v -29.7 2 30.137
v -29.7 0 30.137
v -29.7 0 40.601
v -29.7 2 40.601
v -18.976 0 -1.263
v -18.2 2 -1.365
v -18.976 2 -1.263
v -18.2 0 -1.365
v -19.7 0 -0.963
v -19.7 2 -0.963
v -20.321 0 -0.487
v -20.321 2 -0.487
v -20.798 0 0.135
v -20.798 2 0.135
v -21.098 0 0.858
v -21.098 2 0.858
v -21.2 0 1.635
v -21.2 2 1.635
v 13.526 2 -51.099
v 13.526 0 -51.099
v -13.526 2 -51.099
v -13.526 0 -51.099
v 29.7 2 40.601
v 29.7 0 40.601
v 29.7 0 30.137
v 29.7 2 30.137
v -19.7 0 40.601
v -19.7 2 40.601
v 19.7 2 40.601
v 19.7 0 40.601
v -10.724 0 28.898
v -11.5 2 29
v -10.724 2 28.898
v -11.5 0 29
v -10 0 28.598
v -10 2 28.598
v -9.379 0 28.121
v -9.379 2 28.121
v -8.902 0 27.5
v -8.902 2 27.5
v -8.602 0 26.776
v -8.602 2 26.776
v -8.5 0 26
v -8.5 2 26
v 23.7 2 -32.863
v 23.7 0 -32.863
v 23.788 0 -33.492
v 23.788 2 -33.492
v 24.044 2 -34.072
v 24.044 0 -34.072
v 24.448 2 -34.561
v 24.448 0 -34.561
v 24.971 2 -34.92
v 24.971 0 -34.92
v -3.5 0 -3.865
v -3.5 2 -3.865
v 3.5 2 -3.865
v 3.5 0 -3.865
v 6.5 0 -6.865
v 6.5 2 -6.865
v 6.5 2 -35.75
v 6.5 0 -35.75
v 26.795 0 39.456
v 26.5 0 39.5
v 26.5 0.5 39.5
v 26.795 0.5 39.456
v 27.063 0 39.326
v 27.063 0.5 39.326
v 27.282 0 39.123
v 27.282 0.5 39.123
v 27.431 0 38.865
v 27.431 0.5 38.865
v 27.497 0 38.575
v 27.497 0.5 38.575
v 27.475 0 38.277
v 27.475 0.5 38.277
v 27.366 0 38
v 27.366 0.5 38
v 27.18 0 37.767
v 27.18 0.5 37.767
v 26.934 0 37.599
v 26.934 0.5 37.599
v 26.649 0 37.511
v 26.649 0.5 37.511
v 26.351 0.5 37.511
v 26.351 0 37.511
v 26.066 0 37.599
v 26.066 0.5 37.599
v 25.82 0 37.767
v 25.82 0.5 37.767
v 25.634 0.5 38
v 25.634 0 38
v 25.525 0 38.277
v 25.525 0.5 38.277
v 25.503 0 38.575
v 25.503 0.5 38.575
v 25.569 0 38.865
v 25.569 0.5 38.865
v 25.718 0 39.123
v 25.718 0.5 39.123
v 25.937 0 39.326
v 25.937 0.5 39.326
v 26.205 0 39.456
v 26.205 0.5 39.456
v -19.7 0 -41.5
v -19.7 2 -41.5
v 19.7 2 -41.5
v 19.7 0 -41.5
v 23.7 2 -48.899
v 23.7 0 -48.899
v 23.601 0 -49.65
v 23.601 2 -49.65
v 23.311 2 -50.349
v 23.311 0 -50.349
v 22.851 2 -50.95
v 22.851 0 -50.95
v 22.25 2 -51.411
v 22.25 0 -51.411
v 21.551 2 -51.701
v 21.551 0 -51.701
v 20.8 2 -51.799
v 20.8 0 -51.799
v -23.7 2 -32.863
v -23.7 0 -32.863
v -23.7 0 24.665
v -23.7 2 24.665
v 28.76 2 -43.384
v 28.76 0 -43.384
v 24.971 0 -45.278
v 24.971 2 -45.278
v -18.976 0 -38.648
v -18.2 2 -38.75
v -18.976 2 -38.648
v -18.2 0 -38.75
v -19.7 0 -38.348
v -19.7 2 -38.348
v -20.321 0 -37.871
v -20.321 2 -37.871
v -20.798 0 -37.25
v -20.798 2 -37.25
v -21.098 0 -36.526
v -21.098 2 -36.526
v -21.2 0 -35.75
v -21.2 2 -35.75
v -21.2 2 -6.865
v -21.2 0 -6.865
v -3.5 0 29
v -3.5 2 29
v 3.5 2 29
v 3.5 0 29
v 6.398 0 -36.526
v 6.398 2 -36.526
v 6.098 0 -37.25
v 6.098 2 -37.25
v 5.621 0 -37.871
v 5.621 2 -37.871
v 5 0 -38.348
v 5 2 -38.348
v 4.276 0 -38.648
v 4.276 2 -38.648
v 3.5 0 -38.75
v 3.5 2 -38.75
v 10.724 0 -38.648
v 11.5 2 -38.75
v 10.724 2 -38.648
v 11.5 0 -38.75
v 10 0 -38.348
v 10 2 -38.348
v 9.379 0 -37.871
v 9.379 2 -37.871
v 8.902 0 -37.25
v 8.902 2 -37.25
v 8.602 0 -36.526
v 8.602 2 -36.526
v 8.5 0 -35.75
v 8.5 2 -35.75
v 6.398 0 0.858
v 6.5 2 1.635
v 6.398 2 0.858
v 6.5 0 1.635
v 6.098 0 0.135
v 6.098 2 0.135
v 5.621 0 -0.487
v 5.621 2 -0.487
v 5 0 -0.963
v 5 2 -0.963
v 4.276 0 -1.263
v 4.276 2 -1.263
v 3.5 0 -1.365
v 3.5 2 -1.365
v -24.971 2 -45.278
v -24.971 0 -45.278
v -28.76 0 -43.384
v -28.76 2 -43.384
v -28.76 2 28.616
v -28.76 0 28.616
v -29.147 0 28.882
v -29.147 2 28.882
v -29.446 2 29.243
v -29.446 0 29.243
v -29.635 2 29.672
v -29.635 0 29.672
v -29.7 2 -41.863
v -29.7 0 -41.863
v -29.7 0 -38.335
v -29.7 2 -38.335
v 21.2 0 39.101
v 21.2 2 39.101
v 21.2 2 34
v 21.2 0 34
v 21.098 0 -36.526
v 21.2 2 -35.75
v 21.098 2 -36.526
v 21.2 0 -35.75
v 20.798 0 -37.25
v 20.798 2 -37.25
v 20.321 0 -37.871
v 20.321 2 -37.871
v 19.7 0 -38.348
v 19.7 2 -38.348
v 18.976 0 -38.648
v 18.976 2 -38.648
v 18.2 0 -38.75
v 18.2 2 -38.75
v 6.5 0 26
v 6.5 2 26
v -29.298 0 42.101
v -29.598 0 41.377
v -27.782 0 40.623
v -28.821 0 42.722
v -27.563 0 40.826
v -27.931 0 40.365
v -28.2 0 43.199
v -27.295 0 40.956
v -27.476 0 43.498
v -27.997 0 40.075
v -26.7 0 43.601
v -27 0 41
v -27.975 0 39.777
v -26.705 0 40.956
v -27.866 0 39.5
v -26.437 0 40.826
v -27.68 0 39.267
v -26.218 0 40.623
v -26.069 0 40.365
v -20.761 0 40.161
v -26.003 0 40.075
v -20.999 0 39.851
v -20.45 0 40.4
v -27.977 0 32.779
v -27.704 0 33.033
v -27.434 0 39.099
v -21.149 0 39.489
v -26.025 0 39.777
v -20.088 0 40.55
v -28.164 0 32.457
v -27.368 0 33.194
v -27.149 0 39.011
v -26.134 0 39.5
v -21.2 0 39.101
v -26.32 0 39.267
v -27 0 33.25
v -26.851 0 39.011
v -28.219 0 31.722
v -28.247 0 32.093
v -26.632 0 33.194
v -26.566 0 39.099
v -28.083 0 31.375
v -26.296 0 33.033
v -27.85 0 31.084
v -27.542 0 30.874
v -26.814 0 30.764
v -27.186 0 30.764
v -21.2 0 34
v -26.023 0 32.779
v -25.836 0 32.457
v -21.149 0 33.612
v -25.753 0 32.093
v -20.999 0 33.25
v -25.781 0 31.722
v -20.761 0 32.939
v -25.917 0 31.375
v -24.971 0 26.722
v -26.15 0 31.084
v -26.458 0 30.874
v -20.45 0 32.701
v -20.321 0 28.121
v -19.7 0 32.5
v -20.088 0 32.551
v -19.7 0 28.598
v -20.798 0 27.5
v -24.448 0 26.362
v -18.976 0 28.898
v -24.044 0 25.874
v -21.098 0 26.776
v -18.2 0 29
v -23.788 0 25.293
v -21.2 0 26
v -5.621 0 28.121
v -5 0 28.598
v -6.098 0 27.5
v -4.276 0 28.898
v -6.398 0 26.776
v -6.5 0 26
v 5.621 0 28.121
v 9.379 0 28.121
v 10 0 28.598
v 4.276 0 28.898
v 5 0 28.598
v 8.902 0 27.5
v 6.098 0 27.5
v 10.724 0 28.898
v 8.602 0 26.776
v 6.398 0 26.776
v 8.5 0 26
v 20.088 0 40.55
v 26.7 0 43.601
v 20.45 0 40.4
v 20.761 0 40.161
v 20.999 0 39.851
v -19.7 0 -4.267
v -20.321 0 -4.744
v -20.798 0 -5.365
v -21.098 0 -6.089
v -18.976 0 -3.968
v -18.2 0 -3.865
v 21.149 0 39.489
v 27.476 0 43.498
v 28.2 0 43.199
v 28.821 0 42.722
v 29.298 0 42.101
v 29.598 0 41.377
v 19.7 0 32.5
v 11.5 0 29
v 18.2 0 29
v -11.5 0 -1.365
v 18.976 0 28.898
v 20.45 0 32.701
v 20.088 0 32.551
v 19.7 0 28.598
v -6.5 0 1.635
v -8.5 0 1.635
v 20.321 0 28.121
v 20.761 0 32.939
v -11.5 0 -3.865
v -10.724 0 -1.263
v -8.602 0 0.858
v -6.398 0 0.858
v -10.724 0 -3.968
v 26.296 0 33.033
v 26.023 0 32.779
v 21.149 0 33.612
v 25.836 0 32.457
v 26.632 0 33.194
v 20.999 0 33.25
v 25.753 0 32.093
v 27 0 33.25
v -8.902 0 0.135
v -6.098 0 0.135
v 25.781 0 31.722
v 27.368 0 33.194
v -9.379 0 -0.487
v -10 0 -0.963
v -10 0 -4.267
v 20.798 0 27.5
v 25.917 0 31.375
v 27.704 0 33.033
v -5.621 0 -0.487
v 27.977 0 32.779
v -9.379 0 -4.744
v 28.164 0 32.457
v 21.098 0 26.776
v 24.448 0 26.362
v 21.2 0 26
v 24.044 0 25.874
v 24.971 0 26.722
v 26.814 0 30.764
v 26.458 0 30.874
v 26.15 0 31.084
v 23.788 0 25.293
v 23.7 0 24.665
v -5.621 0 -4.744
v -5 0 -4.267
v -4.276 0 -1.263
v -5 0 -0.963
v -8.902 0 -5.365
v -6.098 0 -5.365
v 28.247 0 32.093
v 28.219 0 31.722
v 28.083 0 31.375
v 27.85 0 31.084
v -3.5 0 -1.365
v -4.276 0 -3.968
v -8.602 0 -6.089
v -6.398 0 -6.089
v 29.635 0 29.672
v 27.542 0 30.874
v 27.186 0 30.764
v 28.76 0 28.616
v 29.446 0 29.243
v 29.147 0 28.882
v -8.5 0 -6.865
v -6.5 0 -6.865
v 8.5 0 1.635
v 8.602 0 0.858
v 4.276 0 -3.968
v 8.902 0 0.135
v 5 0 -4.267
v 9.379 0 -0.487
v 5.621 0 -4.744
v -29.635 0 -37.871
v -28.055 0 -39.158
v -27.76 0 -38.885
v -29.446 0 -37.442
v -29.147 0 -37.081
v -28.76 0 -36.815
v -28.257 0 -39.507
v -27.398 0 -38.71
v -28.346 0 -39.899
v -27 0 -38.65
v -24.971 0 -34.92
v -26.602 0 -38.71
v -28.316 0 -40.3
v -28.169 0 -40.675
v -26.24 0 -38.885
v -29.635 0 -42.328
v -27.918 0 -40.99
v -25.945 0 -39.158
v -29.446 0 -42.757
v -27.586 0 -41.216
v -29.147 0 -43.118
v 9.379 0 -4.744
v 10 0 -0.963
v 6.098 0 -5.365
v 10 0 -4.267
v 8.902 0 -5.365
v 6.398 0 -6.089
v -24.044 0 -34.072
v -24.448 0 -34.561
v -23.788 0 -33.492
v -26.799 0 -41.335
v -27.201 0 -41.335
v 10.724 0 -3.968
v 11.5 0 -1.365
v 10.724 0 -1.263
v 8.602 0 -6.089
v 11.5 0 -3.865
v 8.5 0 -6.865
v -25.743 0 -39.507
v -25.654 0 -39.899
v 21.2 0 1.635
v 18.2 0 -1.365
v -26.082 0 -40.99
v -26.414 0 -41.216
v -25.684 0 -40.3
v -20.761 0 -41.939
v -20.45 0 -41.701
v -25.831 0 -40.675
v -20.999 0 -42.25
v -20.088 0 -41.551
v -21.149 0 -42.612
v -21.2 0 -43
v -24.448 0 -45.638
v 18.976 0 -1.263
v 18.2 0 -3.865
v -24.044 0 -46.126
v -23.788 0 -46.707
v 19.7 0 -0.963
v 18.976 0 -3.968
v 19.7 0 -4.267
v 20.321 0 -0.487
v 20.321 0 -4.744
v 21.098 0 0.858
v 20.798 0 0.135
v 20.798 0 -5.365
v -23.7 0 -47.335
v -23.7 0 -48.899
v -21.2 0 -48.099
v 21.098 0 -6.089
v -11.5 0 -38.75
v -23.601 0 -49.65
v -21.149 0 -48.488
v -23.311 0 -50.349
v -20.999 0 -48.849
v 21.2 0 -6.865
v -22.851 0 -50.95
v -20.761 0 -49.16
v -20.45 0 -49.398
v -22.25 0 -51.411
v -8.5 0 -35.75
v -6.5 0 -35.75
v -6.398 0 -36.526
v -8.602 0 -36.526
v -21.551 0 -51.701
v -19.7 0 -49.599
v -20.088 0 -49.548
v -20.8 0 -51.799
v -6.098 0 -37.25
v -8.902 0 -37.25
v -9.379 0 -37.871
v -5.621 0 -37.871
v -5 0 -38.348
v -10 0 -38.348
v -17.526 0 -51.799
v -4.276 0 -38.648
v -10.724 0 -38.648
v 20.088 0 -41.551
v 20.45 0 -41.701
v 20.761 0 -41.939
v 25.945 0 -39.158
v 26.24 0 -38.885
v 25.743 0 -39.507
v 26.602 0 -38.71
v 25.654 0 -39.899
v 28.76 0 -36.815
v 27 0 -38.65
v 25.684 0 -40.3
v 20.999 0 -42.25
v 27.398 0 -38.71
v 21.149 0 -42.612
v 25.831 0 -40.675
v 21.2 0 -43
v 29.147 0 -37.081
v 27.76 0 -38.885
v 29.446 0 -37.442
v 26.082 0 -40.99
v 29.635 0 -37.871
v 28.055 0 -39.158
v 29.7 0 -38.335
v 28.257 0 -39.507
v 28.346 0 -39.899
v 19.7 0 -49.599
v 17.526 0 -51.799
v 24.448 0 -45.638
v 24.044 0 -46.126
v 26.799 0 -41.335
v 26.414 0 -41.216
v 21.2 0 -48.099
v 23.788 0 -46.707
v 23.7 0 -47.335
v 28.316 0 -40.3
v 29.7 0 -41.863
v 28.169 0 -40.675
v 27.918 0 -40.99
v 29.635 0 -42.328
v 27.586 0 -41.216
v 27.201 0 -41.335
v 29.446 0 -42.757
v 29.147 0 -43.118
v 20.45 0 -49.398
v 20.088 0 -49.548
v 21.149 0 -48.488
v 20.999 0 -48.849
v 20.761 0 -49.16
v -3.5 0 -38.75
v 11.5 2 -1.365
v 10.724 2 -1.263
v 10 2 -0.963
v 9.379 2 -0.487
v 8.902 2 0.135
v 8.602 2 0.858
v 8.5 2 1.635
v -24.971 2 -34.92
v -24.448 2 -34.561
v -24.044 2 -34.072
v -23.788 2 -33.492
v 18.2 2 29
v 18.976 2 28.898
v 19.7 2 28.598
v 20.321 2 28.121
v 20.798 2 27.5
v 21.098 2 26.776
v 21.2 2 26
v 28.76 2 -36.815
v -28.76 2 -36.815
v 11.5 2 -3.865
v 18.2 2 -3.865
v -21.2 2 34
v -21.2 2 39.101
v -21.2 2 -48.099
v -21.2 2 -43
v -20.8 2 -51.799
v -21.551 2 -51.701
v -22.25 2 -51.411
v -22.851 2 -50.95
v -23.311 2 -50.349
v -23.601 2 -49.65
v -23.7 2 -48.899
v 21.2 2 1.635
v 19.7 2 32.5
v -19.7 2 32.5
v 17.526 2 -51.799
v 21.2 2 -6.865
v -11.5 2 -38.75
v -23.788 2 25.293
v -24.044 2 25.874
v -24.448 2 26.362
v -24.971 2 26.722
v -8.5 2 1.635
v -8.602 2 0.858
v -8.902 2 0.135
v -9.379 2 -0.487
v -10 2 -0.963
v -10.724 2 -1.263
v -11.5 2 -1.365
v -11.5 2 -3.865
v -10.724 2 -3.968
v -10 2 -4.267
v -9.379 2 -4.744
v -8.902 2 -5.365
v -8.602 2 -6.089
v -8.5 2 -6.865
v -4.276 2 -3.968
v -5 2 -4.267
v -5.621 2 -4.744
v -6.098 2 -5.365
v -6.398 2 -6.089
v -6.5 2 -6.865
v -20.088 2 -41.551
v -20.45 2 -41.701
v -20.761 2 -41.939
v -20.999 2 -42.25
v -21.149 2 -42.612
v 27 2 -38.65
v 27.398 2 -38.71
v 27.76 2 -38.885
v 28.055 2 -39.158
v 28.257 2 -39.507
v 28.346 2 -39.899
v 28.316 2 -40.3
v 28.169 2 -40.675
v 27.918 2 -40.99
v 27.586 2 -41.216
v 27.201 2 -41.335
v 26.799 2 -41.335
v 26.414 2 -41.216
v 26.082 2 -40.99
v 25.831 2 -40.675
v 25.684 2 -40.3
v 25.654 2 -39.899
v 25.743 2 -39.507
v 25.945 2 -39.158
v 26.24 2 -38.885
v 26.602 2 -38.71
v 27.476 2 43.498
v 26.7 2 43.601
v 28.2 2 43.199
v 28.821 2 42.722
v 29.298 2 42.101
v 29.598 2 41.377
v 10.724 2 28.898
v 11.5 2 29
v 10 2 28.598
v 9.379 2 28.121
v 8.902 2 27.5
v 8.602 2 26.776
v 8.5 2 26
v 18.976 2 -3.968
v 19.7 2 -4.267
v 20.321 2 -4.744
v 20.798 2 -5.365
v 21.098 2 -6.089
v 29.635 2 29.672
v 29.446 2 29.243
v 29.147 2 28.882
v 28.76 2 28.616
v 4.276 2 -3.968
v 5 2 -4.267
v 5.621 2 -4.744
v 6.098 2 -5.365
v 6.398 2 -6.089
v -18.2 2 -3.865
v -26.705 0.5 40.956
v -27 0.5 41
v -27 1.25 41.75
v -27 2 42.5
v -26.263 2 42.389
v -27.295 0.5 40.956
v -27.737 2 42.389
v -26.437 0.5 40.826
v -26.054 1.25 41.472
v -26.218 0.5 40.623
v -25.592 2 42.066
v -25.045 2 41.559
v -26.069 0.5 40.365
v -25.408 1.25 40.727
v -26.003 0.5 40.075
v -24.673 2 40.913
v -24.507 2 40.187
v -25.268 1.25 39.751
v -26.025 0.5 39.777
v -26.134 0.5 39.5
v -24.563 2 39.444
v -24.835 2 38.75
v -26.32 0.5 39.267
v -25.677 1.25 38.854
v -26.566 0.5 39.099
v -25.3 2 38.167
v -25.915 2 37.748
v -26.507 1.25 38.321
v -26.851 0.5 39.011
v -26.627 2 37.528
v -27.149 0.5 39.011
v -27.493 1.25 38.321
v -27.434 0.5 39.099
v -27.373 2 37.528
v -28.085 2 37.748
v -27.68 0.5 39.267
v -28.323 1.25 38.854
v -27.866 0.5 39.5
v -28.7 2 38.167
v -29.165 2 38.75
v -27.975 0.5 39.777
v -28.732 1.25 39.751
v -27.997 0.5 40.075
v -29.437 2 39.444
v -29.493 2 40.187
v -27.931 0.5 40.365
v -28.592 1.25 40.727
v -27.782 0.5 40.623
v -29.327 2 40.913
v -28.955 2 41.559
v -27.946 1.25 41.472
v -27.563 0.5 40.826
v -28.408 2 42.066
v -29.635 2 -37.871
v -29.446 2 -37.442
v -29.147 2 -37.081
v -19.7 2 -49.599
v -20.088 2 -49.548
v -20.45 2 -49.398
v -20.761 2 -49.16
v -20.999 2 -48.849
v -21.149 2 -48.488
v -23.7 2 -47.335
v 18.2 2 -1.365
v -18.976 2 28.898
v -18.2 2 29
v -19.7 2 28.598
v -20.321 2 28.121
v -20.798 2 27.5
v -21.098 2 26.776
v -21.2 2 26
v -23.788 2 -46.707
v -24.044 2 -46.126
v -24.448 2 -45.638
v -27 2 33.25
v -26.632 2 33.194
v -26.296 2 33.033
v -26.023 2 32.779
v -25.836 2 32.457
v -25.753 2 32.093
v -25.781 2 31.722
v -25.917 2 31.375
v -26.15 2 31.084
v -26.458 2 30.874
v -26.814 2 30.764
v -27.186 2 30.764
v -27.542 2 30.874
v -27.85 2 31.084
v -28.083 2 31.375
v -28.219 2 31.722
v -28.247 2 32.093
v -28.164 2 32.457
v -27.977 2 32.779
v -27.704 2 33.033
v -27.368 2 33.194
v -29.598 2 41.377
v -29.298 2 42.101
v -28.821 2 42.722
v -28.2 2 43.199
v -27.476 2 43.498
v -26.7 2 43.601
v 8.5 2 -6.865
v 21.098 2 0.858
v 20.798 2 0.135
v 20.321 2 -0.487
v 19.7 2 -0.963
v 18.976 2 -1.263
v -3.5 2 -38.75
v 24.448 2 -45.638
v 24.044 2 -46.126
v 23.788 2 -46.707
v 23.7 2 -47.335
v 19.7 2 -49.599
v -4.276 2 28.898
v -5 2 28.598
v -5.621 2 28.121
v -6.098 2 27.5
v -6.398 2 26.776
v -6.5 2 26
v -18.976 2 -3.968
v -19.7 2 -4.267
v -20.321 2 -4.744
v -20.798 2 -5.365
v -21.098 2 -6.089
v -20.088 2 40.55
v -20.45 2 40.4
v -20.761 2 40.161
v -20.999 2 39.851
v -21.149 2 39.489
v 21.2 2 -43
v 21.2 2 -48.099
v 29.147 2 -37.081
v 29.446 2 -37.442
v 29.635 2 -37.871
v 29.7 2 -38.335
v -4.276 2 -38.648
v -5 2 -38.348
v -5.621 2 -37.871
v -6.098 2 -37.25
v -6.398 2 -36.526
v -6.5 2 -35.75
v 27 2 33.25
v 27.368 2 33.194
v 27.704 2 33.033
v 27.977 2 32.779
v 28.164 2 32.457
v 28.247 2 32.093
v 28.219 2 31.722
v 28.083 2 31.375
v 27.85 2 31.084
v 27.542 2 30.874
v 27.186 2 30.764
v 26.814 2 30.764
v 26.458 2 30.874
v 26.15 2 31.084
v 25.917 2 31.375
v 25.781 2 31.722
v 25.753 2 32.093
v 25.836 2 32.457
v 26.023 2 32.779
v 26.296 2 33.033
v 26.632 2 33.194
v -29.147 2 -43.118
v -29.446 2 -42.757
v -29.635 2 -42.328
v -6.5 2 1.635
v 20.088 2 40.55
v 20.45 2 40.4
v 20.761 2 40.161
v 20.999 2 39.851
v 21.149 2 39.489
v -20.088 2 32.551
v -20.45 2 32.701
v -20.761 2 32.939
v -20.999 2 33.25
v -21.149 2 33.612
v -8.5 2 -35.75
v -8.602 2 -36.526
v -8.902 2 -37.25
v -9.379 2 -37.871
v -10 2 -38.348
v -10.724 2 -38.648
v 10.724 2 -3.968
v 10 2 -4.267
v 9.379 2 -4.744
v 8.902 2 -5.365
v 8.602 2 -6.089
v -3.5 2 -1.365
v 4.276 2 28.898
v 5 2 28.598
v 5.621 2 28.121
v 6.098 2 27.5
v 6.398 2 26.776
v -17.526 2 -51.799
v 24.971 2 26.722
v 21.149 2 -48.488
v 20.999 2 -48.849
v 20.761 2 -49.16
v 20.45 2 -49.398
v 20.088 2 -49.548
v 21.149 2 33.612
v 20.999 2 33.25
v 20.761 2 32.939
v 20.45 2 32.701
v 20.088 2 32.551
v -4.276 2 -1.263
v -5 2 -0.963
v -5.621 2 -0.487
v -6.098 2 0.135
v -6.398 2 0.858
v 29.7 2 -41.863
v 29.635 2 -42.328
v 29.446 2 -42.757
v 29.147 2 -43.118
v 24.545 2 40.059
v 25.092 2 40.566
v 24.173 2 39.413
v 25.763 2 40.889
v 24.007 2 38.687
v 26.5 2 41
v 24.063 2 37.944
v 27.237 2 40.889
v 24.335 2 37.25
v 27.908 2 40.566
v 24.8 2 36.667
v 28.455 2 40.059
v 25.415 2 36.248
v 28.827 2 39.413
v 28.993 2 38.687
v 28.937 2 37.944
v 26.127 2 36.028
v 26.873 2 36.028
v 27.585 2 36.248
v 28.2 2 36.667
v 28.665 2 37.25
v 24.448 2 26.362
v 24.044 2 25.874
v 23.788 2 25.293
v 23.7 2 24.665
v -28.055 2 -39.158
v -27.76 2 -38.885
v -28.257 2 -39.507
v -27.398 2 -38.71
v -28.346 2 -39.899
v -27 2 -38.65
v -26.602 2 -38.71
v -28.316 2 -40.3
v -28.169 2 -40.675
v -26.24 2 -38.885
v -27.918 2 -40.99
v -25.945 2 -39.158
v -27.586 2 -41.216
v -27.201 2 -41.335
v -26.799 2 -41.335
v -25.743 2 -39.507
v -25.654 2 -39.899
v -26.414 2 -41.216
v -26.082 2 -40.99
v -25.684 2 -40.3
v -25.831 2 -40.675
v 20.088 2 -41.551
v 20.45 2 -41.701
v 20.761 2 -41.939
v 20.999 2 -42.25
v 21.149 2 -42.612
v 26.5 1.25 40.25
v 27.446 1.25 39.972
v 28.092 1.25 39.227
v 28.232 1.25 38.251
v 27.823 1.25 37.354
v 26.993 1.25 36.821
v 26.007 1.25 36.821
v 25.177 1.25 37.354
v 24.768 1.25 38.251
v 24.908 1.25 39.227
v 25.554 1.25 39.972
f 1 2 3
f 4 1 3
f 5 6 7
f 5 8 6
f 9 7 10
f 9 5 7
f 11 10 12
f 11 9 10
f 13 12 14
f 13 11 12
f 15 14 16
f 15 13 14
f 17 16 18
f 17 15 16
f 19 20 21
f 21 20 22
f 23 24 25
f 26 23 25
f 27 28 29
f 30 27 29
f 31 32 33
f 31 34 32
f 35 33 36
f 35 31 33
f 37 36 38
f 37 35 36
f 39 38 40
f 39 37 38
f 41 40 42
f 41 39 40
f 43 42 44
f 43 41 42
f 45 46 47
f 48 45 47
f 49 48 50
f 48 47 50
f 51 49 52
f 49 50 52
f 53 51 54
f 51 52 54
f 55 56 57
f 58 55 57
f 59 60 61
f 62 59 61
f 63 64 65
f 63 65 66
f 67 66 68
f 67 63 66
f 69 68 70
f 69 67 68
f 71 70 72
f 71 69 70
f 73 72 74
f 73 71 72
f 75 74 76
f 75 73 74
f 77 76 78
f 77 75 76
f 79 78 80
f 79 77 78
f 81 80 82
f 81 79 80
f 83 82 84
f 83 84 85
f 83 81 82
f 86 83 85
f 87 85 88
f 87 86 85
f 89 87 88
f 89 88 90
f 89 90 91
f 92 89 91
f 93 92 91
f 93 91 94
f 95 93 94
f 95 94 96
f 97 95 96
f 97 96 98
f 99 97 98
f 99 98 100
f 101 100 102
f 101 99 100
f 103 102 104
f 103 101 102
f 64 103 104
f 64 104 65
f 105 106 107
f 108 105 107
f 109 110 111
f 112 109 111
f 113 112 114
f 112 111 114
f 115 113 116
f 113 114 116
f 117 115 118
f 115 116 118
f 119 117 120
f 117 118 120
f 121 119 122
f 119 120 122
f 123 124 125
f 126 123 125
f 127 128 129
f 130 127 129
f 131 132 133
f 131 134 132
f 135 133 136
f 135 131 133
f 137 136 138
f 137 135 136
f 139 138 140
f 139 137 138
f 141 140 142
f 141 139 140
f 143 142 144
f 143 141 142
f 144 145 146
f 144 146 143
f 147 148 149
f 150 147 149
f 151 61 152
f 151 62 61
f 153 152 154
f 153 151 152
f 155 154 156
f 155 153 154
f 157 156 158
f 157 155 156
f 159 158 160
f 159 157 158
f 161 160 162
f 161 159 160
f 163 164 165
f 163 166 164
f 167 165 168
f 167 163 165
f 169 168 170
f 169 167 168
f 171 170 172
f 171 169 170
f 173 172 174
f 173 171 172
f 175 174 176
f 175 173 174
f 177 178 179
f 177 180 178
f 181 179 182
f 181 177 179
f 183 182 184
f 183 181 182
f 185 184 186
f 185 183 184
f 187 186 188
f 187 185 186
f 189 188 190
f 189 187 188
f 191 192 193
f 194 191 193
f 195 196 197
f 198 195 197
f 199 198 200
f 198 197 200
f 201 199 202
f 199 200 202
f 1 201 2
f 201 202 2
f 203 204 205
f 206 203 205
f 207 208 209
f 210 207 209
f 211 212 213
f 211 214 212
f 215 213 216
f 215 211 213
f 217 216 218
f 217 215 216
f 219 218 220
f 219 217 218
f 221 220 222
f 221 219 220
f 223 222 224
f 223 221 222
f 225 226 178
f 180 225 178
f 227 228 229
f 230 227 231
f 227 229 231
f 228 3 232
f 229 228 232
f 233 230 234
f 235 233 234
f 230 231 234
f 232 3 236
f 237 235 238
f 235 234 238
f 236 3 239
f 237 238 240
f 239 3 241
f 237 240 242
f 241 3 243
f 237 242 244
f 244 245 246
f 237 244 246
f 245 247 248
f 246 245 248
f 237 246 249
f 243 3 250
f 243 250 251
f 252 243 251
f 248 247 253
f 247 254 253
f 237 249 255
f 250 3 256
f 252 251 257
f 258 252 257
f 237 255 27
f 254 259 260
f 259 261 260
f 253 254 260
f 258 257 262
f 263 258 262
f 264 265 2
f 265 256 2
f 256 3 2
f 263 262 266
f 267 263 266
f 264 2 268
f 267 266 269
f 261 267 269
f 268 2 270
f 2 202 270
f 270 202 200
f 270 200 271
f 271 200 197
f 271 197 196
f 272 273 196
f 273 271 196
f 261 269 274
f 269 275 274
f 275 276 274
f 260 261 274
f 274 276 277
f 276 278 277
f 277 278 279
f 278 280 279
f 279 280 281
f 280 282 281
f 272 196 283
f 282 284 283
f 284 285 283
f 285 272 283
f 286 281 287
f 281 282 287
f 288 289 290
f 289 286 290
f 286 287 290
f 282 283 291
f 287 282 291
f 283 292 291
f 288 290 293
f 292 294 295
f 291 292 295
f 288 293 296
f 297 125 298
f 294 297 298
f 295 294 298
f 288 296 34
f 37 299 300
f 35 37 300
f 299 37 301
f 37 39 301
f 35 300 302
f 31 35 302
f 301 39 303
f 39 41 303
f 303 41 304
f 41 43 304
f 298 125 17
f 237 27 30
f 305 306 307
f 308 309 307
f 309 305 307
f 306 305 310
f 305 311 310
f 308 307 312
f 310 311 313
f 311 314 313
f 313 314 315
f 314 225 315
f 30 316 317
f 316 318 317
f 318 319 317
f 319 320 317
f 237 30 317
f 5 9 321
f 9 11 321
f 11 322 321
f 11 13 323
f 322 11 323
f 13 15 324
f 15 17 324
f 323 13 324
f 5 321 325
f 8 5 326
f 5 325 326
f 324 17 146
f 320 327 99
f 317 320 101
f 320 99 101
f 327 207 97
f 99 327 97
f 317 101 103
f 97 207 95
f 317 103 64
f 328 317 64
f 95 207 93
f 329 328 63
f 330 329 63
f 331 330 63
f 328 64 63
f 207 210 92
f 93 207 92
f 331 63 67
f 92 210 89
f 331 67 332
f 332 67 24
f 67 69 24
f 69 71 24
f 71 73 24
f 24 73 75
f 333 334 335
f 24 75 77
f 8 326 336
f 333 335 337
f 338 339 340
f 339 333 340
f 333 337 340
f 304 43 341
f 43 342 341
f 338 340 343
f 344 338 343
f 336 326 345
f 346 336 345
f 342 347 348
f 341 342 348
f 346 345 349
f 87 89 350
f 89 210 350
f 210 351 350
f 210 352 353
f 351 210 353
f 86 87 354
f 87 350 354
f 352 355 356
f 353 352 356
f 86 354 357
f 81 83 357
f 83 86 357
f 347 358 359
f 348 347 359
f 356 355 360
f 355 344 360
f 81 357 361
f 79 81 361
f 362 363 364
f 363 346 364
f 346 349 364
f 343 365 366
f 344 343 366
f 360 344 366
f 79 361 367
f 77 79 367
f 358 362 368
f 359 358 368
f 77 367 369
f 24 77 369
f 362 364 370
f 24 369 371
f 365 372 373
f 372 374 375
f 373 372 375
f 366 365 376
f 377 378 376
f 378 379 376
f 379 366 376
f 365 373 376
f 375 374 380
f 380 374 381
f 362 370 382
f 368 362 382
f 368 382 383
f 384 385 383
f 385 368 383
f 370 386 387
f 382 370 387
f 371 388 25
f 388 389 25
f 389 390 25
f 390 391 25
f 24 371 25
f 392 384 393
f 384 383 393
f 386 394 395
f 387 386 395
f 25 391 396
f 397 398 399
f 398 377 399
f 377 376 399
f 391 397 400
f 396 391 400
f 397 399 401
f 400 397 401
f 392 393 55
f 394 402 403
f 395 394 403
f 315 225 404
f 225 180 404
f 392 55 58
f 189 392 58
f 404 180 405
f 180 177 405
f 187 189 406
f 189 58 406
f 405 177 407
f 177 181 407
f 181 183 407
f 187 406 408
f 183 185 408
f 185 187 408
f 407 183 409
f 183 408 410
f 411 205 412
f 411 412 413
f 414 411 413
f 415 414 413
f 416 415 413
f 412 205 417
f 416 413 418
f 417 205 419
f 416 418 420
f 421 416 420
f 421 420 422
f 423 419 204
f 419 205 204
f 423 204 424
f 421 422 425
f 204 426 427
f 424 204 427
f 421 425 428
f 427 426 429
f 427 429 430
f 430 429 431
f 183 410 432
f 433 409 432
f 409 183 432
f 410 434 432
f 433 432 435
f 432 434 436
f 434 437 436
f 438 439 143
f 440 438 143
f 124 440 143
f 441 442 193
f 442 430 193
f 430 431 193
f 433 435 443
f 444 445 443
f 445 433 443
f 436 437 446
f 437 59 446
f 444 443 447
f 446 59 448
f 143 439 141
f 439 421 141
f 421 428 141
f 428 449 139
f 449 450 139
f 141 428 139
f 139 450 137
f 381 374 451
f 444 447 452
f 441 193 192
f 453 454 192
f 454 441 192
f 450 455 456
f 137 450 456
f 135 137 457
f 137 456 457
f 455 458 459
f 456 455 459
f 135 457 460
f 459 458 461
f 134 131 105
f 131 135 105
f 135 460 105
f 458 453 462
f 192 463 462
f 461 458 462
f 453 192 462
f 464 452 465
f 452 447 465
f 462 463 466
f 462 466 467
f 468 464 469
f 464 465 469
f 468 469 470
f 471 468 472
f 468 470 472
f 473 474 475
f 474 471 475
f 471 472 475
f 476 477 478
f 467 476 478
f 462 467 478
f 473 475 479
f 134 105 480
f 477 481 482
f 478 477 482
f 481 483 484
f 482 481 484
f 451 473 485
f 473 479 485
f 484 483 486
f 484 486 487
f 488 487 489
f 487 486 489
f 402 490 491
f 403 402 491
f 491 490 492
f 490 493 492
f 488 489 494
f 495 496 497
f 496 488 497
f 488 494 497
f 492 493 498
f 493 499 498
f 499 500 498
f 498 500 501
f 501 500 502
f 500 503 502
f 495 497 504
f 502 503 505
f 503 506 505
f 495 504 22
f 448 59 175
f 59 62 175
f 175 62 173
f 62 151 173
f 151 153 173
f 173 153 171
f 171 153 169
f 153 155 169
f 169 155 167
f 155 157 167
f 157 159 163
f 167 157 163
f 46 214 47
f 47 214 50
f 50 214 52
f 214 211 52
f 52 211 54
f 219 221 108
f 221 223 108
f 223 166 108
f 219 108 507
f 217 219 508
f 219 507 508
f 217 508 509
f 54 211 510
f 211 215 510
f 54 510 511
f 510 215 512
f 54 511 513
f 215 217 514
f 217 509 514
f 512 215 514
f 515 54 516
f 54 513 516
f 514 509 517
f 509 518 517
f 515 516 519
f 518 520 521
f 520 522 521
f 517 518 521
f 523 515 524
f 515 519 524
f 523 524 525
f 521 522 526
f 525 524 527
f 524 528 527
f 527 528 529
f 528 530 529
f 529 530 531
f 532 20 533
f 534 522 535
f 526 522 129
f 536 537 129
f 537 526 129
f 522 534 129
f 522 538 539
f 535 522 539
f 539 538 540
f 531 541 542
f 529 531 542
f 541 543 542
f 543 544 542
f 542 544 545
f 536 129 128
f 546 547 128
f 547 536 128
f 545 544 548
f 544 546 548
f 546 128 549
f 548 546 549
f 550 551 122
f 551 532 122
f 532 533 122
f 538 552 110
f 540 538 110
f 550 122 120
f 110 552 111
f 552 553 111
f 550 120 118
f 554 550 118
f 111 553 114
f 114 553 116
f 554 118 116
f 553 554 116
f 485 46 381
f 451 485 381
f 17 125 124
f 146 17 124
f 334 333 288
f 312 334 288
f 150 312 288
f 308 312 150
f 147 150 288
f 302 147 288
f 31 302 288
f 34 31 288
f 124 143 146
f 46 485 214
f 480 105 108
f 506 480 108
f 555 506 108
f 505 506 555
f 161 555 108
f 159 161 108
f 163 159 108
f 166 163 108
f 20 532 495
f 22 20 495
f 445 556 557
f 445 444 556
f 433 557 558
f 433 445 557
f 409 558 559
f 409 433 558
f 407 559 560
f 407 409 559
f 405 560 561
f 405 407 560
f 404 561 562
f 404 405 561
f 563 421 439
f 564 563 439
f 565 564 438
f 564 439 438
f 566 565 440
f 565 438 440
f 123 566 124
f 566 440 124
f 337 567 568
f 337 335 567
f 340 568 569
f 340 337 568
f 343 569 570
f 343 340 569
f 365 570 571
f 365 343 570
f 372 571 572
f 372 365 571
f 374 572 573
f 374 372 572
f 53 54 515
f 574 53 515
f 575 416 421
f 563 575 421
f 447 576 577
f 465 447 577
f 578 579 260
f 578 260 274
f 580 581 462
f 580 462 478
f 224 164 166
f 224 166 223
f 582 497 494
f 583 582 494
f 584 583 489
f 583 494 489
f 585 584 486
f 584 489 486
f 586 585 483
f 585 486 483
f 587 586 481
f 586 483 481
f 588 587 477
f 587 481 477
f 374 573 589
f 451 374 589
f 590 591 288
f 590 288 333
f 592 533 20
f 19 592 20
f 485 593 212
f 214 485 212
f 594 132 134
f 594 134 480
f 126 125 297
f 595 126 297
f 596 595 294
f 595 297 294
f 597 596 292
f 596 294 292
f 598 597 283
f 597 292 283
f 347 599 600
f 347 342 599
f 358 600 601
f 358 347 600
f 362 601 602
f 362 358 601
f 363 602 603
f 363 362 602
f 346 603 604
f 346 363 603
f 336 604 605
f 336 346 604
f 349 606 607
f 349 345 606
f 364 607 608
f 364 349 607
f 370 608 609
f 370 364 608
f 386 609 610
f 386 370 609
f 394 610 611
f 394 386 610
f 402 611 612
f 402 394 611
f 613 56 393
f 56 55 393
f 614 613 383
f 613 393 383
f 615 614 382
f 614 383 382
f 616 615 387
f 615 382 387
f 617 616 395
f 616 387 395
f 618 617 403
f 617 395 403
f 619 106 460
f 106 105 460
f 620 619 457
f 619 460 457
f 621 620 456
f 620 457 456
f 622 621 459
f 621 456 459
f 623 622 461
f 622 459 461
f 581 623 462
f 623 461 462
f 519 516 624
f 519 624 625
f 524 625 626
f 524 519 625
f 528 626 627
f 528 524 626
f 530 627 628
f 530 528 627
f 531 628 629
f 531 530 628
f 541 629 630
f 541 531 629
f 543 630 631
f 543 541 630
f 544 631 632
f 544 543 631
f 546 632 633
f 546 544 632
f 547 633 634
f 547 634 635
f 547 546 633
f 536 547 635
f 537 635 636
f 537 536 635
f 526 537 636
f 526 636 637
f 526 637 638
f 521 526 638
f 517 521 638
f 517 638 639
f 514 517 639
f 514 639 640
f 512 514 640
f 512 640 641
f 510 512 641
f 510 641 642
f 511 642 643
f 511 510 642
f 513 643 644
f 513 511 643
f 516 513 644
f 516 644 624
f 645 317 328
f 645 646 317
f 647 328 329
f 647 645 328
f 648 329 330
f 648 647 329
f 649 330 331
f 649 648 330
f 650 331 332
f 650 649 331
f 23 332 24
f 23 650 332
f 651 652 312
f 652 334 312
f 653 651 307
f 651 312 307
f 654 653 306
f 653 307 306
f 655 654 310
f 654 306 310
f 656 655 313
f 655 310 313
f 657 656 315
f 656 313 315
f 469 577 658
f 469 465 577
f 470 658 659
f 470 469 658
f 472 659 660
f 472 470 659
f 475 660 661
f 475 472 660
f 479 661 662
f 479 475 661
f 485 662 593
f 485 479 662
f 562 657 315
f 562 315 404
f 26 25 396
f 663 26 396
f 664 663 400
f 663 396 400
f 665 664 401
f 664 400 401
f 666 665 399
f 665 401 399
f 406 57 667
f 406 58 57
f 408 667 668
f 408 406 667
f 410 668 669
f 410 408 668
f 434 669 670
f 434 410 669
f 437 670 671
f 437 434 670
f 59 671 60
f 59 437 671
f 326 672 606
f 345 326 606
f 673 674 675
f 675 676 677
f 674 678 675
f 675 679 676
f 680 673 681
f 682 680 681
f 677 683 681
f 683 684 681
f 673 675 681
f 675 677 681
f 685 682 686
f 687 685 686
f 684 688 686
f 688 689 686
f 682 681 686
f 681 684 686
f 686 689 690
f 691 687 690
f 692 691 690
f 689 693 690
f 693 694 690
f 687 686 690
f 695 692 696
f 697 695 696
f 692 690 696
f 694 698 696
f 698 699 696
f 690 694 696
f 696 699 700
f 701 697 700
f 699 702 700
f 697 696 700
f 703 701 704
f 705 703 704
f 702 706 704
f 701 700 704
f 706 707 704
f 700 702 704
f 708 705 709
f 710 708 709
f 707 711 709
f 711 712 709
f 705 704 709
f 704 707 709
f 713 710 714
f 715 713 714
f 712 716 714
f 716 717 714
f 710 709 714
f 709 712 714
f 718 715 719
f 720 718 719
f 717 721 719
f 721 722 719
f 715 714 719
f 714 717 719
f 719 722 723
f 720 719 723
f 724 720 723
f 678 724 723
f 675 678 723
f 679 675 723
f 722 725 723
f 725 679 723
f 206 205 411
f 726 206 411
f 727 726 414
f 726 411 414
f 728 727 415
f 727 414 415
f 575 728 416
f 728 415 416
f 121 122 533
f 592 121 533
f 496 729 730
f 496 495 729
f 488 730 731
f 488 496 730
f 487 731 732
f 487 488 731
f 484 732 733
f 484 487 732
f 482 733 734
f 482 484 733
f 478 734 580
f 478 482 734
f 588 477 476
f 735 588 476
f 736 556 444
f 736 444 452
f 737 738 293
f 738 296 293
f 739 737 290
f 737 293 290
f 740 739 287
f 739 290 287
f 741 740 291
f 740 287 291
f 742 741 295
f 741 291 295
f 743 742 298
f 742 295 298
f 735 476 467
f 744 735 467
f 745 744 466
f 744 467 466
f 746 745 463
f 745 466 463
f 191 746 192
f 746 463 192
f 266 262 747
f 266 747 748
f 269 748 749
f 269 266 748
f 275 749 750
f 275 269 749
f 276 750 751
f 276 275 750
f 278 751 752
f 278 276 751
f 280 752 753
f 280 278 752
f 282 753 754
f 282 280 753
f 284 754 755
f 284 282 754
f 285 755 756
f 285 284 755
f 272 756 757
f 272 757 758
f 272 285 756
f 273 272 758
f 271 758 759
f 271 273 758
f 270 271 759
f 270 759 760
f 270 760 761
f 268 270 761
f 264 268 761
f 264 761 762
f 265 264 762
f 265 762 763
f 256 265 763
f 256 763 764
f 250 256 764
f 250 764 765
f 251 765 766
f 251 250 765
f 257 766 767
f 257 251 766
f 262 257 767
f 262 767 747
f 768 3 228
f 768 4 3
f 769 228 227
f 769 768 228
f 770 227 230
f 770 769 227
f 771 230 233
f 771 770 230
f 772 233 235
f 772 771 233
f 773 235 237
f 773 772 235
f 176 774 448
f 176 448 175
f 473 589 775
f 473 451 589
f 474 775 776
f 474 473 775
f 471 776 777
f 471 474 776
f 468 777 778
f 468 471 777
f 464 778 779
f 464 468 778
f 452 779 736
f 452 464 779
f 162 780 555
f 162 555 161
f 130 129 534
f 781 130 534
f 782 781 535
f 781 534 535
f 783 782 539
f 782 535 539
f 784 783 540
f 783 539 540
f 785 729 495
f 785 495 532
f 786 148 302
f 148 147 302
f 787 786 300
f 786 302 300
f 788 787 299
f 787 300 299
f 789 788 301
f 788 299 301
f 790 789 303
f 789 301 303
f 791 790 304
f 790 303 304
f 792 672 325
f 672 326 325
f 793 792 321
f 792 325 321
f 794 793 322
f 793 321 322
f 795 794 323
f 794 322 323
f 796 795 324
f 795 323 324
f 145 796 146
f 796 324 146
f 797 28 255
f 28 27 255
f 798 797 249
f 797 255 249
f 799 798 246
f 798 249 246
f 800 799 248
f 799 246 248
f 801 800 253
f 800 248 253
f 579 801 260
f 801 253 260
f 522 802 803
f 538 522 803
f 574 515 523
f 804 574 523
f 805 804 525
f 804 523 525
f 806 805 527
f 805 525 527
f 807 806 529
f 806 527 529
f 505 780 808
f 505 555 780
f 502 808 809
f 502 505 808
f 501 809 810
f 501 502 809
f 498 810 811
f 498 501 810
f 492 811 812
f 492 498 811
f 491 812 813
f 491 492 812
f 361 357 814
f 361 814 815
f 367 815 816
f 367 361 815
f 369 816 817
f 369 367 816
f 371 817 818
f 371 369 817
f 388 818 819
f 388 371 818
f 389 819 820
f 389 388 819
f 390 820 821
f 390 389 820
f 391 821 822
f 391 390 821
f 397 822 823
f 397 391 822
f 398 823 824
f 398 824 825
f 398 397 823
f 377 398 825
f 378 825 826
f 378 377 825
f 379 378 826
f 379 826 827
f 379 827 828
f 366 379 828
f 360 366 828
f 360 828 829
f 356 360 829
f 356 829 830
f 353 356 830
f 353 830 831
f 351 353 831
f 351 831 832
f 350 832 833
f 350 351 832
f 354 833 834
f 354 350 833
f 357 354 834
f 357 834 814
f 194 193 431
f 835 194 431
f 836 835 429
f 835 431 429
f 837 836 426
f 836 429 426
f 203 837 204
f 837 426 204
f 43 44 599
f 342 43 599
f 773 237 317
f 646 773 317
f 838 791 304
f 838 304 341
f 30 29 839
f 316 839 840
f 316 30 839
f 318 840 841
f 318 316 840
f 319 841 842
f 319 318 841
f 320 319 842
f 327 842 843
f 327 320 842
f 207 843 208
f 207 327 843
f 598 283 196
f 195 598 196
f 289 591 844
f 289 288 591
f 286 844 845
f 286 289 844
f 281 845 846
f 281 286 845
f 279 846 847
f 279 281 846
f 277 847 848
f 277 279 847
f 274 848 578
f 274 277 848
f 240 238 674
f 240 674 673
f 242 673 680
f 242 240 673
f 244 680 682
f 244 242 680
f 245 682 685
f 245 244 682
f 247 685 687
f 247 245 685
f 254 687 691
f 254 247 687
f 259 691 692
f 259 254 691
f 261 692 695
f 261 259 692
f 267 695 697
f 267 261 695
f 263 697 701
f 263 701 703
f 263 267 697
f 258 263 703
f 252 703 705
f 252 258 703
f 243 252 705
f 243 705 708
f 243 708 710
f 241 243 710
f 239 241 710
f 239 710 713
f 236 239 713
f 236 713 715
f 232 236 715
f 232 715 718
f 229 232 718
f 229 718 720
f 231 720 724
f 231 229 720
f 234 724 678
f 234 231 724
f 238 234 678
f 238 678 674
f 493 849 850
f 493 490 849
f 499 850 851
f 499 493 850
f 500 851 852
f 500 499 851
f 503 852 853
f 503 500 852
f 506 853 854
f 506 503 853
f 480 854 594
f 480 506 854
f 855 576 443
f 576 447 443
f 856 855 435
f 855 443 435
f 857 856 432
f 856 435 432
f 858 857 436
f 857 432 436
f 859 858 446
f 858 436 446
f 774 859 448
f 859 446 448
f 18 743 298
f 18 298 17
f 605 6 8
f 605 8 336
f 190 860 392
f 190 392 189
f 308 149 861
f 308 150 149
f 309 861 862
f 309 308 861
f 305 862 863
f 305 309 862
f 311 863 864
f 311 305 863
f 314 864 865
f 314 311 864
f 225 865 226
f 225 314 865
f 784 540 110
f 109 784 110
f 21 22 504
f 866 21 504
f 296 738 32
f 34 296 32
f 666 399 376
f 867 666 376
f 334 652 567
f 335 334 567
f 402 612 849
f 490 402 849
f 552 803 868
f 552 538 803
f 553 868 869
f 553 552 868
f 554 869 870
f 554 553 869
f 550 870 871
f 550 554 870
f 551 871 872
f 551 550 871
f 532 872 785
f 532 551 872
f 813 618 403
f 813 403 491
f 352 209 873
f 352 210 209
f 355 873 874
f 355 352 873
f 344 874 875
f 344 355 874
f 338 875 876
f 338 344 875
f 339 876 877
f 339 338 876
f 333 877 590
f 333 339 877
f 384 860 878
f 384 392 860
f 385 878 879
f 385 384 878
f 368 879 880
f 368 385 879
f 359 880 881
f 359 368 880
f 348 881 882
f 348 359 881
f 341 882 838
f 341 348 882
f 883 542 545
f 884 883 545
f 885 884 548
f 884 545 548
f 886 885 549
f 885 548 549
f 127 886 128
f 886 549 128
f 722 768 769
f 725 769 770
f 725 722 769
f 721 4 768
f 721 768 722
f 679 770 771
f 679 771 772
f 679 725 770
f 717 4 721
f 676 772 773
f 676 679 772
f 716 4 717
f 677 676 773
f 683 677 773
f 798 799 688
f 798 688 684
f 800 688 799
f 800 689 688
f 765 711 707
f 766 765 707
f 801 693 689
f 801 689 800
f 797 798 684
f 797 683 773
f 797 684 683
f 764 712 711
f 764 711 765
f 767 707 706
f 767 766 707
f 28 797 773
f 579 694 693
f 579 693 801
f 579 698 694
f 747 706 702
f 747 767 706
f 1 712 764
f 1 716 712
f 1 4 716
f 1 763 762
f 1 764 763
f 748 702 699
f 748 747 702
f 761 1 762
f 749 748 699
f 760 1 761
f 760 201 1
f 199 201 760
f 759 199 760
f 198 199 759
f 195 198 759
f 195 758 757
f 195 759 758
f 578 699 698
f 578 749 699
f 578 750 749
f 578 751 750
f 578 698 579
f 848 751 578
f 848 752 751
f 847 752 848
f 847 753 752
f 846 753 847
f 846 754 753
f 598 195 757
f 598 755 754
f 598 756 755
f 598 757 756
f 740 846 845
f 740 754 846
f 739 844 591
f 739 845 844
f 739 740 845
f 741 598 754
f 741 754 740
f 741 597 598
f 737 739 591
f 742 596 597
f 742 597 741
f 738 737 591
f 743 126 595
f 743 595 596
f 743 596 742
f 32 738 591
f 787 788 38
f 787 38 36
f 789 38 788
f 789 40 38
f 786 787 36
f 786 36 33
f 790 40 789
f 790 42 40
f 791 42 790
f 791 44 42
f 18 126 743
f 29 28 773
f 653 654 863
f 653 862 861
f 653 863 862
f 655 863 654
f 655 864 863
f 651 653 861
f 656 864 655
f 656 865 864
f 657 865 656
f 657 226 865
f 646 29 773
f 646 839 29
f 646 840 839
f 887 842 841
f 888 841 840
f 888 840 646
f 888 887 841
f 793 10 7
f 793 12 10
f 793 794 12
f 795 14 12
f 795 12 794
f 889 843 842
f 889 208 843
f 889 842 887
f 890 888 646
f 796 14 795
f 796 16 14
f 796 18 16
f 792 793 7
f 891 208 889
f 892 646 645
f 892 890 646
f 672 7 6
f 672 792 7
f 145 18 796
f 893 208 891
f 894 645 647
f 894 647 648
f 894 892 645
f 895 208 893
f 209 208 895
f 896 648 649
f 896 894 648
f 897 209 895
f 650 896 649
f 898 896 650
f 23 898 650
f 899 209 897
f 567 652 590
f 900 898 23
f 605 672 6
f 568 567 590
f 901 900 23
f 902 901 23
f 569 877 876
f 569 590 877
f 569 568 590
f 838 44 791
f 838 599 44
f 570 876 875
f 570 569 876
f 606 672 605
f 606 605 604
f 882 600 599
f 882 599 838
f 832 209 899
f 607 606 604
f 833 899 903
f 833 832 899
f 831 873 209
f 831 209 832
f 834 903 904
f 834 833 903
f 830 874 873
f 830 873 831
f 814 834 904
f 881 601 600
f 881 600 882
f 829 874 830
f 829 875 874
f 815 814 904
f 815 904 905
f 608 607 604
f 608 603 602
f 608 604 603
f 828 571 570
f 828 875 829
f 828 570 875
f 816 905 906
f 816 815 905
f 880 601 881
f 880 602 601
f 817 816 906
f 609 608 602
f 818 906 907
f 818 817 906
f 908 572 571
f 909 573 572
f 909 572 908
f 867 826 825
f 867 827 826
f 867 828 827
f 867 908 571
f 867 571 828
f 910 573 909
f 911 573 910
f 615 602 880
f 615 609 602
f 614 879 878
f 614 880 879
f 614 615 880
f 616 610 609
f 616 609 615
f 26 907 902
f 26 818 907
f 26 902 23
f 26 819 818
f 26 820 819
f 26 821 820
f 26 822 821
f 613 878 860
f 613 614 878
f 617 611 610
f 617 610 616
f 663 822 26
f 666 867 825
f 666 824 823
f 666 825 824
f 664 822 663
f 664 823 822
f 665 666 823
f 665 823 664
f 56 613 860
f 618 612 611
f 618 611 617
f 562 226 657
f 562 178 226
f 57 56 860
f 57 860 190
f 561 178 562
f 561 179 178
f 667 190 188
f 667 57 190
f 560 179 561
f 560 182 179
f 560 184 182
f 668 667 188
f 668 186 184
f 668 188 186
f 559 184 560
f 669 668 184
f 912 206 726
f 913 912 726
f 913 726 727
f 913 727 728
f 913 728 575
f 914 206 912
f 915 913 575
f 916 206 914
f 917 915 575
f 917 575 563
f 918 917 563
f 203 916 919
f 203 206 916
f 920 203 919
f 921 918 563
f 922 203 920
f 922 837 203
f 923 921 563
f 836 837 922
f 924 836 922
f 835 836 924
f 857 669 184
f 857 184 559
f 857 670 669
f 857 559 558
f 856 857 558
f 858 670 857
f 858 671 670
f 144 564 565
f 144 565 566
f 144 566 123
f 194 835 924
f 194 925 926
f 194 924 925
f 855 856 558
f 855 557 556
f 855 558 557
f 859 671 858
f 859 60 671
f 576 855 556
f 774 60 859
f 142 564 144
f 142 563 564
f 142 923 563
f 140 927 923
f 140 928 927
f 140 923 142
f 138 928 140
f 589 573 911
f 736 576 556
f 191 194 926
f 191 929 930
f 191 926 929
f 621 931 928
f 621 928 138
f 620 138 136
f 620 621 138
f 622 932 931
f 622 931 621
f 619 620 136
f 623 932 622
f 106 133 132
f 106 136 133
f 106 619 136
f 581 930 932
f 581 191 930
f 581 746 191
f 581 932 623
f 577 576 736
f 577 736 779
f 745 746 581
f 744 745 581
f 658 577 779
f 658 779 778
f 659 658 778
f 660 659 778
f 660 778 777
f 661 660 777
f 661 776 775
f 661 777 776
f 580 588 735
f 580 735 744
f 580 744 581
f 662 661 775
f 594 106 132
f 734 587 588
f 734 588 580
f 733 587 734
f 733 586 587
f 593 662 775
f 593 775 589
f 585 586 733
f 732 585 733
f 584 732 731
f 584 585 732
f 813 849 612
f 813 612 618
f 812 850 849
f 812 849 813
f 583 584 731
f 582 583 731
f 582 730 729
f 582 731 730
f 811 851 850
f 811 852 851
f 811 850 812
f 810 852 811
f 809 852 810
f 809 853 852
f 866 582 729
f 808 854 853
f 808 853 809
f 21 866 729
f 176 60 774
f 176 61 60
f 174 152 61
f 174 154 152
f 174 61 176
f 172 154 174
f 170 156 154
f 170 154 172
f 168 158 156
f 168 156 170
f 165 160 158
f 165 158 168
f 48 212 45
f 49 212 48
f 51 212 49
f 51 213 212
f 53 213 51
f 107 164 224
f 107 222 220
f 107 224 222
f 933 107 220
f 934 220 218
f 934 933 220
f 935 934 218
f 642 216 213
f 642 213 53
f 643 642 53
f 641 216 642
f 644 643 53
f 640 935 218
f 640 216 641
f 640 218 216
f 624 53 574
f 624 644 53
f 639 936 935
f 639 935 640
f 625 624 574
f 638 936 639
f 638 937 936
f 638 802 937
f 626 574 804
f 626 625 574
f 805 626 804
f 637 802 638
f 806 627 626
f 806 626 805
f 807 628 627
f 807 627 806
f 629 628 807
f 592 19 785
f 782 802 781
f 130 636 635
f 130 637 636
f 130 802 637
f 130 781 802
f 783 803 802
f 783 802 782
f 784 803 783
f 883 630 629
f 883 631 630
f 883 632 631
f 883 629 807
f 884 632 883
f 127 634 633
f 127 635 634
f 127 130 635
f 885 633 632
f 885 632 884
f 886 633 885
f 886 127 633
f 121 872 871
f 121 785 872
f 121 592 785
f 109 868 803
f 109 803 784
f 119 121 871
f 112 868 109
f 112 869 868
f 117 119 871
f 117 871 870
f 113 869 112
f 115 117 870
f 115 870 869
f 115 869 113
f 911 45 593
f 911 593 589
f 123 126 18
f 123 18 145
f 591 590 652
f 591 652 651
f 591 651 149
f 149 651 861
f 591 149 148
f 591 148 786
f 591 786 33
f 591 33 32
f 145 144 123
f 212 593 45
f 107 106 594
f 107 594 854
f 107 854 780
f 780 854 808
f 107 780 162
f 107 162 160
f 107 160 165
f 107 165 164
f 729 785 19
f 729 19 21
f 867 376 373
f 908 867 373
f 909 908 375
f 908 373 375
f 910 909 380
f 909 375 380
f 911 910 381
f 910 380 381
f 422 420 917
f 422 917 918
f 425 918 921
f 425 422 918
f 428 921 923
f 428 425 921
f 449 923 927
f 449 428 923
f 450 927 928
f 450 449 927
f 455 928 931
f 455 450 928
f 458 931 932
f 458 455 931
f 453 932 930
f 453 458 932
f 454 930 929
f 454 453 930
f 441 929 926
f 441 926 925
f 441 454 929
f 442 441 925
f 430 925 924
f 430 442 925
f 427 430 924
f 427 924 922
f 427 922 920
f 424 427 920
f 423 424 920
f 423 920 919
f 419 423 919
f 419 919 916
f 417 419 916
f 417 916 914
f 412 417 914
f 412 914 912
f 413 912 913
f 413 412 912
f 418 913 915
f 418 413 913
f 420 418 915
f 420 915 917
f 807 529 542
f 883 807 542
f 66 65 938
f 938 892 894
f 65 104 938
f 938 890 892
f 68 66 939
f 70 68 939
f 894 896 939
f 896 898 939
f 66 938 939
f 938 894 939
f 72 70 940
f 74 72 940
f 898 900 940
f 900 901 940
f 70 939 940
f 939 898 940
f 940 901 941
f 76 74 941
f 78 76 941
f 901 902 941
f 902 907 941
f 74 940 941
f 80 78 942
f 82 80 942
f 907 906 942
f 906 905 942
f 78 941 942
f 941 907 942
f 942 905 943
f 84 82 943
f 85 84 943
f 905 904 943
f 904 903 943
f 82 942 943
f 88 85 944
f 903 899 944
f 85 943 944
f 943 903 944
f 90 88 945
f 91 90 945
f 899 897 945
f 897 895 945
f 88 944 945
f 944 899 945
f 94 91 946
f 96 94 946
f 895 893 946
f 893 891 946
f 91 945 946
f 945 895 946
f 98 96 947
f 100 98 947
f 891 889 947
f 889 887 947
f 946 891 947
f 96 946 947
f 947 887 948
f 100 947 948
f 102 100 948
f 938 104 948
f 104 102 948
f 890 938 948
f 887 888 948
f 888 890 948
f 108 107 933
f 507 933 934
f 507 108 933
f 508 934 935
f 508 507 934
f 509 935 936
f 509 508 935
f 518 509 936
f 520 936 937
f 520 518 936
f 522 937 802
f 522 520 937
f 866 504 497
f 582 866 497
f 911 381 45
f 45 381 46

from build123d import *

# Parameters (mm, degrees)
SKETCH_1_R          = 1.35
SKETCH_1_R_2        = 1
SKETCH_1_R_3        = 1.25
EXTRUDE_1_DEPTH     = 2
FILLET_1_R          = 3
SKETCH_3_W          = 12.7
SKETCH_3_H          = 30.365325547
SKETCH_3_W_2        = 13
SKETCH_3_H_2        = 34.884674453
SKETCH_3_W_3        = 42.4
SKETCH_3_H_3        = 8.100647313
SKETCH_3_H_4        = 8.099352903
CUT_EXTRUDE_1_DEPTH = 60.74330897
FILLET_2_R          = 3
FILLET_3_R          = 1.5
CHAMFER_1_SIZE      = 1.5


with BuildPart() as part:
    # 草图1 → 凸台-拉伸1 (new body)
    with BuildSketch(Plane(origin=(0, 0, 0), x_dir=(1, 0, 0), z_dir=(0, 1, 0))):
        with BuildLine():
            Line((-29.7, -30.13671529), (-29.7, -43.600647313))
            Line((-29.7, -43.600647313), (29.7, -43.600647313))
            Line((29.7, -43.600647313), (29.7, -30.13671529))
            ThreePointArc((29.7, -30.13671529), (29.446106374, -29.2429724), (28.760263112, -28.616189066))
            Line((28.760263112, -28.616189066), (24.97140873, -26.721761875))
            ThreePointArc((24.97140873, -26.721761875), (24.043503141, -25.873760893), (23.7, -24.664579335))
            Line((23.7, -24.664579335), (23.7, 32.86328471))
            ThreePointArc((23.7, 32.86328471), (24.043503141, 34.072466267), (24.97140873, 34.920467249))
            Line((24.97140873, 34.920467249), (28.760263112, 36.81489444))
            ThreePointArc((28.760263112, 36.81489444), (29.446106374, 37.441677774), (29.7, 38.335420665))
            Line((29.7, 38.335420665), (29.7, 41.863284896))
            ThreePointArc((29.7, 41.863284896), (29.446106374, 42.757027787), (28.760263112, 43.383811121))
            Line((28.760263112, 43.383811121), (24.971408673, 45.278238341))
            ThreePointArc((24.971408673, 45.278238341), (24.043503084, 46.126239322), (23.699999943, 47.33542088))
            Line((23.699999943, 47.33542088), (23.699999943, 48.899352903))
            ThreePointArc((23.699999943, 48.899352903), (22.850609608, 50.949962568), (20.799999943, 51.799352902))
            Line((20.799999943, 51.799352902), (17.526051986, 51.799352902))
            Line((17.526051986, 51.799352902), (13.526051986, 51.099352903))
            Line((13.526051986, 51.099352903), (-13.5260521, 51.099352903))
            Line((-13.5260521, 51.099352903), (-17.5260521, 51.799352903))
            Line((-17.5260521, 51.799352903), (-20.800000057, 51.799352903))
            ThreePointArc((-20.800000057, 51.799352903), (-22.850609723, 50.949962568), (-23.700000057, 48.899352903))
            Line((-23.700000057, 48.899352903), (-23.700000057, 47.33542088))
            ThreePointArc((-23.700000057, 47.33542088), (-24.043503184, 46.126239345), (-24.97140874, 45.278238364))
            Line((-24.97140874, 45.278238364), (-28.760263161, 43.383811045))
            ThreePointArc((-28.760263161, 43.383811045), (-29.446106456, 42.757027659), (-29.700000093, 41.86328471))
            Line((-29.700000093, 41.86328471), (-29.700000093, 38.335420665))
            ThreePointArc((-29.700000093, 38.335420665), (-29.446106448, 37.44167771), (-28.760263093, 36.814894415))
            Line((-28.760263093, 36.814894415), (-24.971408738, 34.920467256))
            ThreePointArc((-24.971408738, 34.920467256), (-24.043503143, 34.072466274), (-23.7, 32.863284713))
            Line((-23.7, 32.863284713), (-23.7, -24.664579335))
            ThreePointArc((-23.7, -24.664579335), (-24.043503141, -25.873760893), (-24.97140873, -26.721761875))
            Line((-24.97140873, -26.721761875), (-28.760263112, -28.616189066))
            ThreePointArc((-28.760263112, -28.616189066), (-29.446106374, -29.2429724), (-29.7, -30.13671529))
        make_face()
        with Locations(Location((-27, 40, 0), (0, 0, 270))):
            Circle(SKETCH_1_R, mode=Mode.SUBTRACT)
        with Locations(Location((27, 40, 0), (0, 0, 270))):
            Circle(SKETCH_1_R, mode=Mode.SUBTRACT)
        with Locations(Location((-27, -40, 0), (0, 0, 270))):
            Circle(SKETCH_1_R_2, mode=Mode.SUBTRACT)
        with Locations(Location((26.5, -38.5, 0), (0, 0, 270))):
            Circle(SKETCH_1_R_2, mode=Mode.SUBTRACT)
        with Locations(Location((-27, -32, 0), (0, 0, 270))):
            Circle(SKETCH_1_R_3, mode=Mode.SUBTRACT)
        with Locations(Location((27, -32, 0), (0, 0, 270))):
            Circle(SKETCH_1_R_3, mode=Mode.SUBTRACT)
    extrude(amount=EXTRUDE_1_DEPTH)

    # 圆角1
    fillet_1_edges = [part.edges().sort_by_distance(p)[0] for p in [
        (29.7, 1, 43.600647313),
        (-29.7, 1, 43.600647313),
    ]]
    fillet(fillet_1_edges, radius=FILLET_1_R)

    # 草图3 → 切除-拉伸1 (cut, through all)
    with BuildSketch(Plane(origin=(0, 2, 0), x_dir=(1, 0, 0), z_dir=(0, 1, 0))):
        with Locations((14.85, -13.817337227)):
            Rectangle(SKETCH_3_W, SKETCH_3_H)
        with Locations((0, -13.817337227)):
            Rectangle(SKETCH_3_W_2, SKETCH_3_H)
        with Locations((-14.85, 21.307662773)):
            Rectangle(SKETCH_3_W, SKETCH_3_H_2)
        with Locations((0, 21.307662773)):
            Rectangle(SKETCH_3_W_2, SKETCH_3_H_2)
        with Locations((-14.85, -13.817337227)):
            Rectangle(SKETCH_3_W, SKETCH_3_H)
        with Locations((14.85, 21.307662773)):
            Rectangle(SKETCH_3_W, SKETCH_3_H_2)
        with Locations((0, -36.550323656)):
            Rectangle(SKETCH_3_W_3, SKETCH_3_H_3)
        with Locations((0, 45.549676452)):
            Rectangle(SKETCH_3_W_3, SKETCH_3_H_4)
    extrude(amount=-CUT_EXTRUDE_1_DEPTH, mode=Mode.SUBTRACT)

    # 圆角2
    fillet_2_edges = [part.edges().sort_by_distance(p)[0] for p in [
        (21.2, 1, -1.365325547),
        (21.2, 1, 29),
        (8.5, 1, 29),
        (8.5, 1, -1.365325547),
        (-21.2, 1, 29),
        (-21.2, 1, -1.365325547),
        (-8.5, 1, -1.365325547),
        (-8.5, 1, 29),
        (-6.5, 1, 29),
        (-6.5, 1, -1.365325547),
        (6.5, 1, -1.365325547),
        (6.5, 1, 29),
        (-6.5, 1, -3.865325547),
        (-6.5, 1, -38.75),
        (6.5, 1, -38.75),
        (6.5, 1, -3.865325547),
        (21.2, 1, -38.75),
        (21.2, 1, -3.865325547),
        (8.5, 1, -3.865325547),
        (8.5, 1, -38.75),
        (-21.2, 1, -3.865325547),
        (-21.2, 1, -38.75),
        (-8.5, 1, -38.75),
        (-8.5, 1, -3.865325547),
    ]]
    fillet(fillet_2_edges, radius=FILLET_2_R)

    # 圆角3
    fillet_3_edges = [part.edges().sort_by_distance(p)[0] for p in [
        (-21.2, 1, 40.600647313),
        (-21.2, 1, 32.5),
        (21.2, 1, 32.5),
        (21.2, 1, 40.600647313),
        (-21.2, 1, -41.5),
        (-21.2, 1, -49.599352903),
        (21.2, 1, -49.599352903),
        (21.2, 1, -41.5),
    ]]
    fillet(fillet_3_edges, radius=FILLET_3_R)

    # 倒角1
    chamfer_1_edges = [part.edges().sort_by_distance(p)[0] for p in [
        (-27, 2, 39),
        (26.5, 2, 37.5),
    ]]
    chamfer(chamfer_1_edges, length=CHAMFER_1_SIZE)


solid = part.part
